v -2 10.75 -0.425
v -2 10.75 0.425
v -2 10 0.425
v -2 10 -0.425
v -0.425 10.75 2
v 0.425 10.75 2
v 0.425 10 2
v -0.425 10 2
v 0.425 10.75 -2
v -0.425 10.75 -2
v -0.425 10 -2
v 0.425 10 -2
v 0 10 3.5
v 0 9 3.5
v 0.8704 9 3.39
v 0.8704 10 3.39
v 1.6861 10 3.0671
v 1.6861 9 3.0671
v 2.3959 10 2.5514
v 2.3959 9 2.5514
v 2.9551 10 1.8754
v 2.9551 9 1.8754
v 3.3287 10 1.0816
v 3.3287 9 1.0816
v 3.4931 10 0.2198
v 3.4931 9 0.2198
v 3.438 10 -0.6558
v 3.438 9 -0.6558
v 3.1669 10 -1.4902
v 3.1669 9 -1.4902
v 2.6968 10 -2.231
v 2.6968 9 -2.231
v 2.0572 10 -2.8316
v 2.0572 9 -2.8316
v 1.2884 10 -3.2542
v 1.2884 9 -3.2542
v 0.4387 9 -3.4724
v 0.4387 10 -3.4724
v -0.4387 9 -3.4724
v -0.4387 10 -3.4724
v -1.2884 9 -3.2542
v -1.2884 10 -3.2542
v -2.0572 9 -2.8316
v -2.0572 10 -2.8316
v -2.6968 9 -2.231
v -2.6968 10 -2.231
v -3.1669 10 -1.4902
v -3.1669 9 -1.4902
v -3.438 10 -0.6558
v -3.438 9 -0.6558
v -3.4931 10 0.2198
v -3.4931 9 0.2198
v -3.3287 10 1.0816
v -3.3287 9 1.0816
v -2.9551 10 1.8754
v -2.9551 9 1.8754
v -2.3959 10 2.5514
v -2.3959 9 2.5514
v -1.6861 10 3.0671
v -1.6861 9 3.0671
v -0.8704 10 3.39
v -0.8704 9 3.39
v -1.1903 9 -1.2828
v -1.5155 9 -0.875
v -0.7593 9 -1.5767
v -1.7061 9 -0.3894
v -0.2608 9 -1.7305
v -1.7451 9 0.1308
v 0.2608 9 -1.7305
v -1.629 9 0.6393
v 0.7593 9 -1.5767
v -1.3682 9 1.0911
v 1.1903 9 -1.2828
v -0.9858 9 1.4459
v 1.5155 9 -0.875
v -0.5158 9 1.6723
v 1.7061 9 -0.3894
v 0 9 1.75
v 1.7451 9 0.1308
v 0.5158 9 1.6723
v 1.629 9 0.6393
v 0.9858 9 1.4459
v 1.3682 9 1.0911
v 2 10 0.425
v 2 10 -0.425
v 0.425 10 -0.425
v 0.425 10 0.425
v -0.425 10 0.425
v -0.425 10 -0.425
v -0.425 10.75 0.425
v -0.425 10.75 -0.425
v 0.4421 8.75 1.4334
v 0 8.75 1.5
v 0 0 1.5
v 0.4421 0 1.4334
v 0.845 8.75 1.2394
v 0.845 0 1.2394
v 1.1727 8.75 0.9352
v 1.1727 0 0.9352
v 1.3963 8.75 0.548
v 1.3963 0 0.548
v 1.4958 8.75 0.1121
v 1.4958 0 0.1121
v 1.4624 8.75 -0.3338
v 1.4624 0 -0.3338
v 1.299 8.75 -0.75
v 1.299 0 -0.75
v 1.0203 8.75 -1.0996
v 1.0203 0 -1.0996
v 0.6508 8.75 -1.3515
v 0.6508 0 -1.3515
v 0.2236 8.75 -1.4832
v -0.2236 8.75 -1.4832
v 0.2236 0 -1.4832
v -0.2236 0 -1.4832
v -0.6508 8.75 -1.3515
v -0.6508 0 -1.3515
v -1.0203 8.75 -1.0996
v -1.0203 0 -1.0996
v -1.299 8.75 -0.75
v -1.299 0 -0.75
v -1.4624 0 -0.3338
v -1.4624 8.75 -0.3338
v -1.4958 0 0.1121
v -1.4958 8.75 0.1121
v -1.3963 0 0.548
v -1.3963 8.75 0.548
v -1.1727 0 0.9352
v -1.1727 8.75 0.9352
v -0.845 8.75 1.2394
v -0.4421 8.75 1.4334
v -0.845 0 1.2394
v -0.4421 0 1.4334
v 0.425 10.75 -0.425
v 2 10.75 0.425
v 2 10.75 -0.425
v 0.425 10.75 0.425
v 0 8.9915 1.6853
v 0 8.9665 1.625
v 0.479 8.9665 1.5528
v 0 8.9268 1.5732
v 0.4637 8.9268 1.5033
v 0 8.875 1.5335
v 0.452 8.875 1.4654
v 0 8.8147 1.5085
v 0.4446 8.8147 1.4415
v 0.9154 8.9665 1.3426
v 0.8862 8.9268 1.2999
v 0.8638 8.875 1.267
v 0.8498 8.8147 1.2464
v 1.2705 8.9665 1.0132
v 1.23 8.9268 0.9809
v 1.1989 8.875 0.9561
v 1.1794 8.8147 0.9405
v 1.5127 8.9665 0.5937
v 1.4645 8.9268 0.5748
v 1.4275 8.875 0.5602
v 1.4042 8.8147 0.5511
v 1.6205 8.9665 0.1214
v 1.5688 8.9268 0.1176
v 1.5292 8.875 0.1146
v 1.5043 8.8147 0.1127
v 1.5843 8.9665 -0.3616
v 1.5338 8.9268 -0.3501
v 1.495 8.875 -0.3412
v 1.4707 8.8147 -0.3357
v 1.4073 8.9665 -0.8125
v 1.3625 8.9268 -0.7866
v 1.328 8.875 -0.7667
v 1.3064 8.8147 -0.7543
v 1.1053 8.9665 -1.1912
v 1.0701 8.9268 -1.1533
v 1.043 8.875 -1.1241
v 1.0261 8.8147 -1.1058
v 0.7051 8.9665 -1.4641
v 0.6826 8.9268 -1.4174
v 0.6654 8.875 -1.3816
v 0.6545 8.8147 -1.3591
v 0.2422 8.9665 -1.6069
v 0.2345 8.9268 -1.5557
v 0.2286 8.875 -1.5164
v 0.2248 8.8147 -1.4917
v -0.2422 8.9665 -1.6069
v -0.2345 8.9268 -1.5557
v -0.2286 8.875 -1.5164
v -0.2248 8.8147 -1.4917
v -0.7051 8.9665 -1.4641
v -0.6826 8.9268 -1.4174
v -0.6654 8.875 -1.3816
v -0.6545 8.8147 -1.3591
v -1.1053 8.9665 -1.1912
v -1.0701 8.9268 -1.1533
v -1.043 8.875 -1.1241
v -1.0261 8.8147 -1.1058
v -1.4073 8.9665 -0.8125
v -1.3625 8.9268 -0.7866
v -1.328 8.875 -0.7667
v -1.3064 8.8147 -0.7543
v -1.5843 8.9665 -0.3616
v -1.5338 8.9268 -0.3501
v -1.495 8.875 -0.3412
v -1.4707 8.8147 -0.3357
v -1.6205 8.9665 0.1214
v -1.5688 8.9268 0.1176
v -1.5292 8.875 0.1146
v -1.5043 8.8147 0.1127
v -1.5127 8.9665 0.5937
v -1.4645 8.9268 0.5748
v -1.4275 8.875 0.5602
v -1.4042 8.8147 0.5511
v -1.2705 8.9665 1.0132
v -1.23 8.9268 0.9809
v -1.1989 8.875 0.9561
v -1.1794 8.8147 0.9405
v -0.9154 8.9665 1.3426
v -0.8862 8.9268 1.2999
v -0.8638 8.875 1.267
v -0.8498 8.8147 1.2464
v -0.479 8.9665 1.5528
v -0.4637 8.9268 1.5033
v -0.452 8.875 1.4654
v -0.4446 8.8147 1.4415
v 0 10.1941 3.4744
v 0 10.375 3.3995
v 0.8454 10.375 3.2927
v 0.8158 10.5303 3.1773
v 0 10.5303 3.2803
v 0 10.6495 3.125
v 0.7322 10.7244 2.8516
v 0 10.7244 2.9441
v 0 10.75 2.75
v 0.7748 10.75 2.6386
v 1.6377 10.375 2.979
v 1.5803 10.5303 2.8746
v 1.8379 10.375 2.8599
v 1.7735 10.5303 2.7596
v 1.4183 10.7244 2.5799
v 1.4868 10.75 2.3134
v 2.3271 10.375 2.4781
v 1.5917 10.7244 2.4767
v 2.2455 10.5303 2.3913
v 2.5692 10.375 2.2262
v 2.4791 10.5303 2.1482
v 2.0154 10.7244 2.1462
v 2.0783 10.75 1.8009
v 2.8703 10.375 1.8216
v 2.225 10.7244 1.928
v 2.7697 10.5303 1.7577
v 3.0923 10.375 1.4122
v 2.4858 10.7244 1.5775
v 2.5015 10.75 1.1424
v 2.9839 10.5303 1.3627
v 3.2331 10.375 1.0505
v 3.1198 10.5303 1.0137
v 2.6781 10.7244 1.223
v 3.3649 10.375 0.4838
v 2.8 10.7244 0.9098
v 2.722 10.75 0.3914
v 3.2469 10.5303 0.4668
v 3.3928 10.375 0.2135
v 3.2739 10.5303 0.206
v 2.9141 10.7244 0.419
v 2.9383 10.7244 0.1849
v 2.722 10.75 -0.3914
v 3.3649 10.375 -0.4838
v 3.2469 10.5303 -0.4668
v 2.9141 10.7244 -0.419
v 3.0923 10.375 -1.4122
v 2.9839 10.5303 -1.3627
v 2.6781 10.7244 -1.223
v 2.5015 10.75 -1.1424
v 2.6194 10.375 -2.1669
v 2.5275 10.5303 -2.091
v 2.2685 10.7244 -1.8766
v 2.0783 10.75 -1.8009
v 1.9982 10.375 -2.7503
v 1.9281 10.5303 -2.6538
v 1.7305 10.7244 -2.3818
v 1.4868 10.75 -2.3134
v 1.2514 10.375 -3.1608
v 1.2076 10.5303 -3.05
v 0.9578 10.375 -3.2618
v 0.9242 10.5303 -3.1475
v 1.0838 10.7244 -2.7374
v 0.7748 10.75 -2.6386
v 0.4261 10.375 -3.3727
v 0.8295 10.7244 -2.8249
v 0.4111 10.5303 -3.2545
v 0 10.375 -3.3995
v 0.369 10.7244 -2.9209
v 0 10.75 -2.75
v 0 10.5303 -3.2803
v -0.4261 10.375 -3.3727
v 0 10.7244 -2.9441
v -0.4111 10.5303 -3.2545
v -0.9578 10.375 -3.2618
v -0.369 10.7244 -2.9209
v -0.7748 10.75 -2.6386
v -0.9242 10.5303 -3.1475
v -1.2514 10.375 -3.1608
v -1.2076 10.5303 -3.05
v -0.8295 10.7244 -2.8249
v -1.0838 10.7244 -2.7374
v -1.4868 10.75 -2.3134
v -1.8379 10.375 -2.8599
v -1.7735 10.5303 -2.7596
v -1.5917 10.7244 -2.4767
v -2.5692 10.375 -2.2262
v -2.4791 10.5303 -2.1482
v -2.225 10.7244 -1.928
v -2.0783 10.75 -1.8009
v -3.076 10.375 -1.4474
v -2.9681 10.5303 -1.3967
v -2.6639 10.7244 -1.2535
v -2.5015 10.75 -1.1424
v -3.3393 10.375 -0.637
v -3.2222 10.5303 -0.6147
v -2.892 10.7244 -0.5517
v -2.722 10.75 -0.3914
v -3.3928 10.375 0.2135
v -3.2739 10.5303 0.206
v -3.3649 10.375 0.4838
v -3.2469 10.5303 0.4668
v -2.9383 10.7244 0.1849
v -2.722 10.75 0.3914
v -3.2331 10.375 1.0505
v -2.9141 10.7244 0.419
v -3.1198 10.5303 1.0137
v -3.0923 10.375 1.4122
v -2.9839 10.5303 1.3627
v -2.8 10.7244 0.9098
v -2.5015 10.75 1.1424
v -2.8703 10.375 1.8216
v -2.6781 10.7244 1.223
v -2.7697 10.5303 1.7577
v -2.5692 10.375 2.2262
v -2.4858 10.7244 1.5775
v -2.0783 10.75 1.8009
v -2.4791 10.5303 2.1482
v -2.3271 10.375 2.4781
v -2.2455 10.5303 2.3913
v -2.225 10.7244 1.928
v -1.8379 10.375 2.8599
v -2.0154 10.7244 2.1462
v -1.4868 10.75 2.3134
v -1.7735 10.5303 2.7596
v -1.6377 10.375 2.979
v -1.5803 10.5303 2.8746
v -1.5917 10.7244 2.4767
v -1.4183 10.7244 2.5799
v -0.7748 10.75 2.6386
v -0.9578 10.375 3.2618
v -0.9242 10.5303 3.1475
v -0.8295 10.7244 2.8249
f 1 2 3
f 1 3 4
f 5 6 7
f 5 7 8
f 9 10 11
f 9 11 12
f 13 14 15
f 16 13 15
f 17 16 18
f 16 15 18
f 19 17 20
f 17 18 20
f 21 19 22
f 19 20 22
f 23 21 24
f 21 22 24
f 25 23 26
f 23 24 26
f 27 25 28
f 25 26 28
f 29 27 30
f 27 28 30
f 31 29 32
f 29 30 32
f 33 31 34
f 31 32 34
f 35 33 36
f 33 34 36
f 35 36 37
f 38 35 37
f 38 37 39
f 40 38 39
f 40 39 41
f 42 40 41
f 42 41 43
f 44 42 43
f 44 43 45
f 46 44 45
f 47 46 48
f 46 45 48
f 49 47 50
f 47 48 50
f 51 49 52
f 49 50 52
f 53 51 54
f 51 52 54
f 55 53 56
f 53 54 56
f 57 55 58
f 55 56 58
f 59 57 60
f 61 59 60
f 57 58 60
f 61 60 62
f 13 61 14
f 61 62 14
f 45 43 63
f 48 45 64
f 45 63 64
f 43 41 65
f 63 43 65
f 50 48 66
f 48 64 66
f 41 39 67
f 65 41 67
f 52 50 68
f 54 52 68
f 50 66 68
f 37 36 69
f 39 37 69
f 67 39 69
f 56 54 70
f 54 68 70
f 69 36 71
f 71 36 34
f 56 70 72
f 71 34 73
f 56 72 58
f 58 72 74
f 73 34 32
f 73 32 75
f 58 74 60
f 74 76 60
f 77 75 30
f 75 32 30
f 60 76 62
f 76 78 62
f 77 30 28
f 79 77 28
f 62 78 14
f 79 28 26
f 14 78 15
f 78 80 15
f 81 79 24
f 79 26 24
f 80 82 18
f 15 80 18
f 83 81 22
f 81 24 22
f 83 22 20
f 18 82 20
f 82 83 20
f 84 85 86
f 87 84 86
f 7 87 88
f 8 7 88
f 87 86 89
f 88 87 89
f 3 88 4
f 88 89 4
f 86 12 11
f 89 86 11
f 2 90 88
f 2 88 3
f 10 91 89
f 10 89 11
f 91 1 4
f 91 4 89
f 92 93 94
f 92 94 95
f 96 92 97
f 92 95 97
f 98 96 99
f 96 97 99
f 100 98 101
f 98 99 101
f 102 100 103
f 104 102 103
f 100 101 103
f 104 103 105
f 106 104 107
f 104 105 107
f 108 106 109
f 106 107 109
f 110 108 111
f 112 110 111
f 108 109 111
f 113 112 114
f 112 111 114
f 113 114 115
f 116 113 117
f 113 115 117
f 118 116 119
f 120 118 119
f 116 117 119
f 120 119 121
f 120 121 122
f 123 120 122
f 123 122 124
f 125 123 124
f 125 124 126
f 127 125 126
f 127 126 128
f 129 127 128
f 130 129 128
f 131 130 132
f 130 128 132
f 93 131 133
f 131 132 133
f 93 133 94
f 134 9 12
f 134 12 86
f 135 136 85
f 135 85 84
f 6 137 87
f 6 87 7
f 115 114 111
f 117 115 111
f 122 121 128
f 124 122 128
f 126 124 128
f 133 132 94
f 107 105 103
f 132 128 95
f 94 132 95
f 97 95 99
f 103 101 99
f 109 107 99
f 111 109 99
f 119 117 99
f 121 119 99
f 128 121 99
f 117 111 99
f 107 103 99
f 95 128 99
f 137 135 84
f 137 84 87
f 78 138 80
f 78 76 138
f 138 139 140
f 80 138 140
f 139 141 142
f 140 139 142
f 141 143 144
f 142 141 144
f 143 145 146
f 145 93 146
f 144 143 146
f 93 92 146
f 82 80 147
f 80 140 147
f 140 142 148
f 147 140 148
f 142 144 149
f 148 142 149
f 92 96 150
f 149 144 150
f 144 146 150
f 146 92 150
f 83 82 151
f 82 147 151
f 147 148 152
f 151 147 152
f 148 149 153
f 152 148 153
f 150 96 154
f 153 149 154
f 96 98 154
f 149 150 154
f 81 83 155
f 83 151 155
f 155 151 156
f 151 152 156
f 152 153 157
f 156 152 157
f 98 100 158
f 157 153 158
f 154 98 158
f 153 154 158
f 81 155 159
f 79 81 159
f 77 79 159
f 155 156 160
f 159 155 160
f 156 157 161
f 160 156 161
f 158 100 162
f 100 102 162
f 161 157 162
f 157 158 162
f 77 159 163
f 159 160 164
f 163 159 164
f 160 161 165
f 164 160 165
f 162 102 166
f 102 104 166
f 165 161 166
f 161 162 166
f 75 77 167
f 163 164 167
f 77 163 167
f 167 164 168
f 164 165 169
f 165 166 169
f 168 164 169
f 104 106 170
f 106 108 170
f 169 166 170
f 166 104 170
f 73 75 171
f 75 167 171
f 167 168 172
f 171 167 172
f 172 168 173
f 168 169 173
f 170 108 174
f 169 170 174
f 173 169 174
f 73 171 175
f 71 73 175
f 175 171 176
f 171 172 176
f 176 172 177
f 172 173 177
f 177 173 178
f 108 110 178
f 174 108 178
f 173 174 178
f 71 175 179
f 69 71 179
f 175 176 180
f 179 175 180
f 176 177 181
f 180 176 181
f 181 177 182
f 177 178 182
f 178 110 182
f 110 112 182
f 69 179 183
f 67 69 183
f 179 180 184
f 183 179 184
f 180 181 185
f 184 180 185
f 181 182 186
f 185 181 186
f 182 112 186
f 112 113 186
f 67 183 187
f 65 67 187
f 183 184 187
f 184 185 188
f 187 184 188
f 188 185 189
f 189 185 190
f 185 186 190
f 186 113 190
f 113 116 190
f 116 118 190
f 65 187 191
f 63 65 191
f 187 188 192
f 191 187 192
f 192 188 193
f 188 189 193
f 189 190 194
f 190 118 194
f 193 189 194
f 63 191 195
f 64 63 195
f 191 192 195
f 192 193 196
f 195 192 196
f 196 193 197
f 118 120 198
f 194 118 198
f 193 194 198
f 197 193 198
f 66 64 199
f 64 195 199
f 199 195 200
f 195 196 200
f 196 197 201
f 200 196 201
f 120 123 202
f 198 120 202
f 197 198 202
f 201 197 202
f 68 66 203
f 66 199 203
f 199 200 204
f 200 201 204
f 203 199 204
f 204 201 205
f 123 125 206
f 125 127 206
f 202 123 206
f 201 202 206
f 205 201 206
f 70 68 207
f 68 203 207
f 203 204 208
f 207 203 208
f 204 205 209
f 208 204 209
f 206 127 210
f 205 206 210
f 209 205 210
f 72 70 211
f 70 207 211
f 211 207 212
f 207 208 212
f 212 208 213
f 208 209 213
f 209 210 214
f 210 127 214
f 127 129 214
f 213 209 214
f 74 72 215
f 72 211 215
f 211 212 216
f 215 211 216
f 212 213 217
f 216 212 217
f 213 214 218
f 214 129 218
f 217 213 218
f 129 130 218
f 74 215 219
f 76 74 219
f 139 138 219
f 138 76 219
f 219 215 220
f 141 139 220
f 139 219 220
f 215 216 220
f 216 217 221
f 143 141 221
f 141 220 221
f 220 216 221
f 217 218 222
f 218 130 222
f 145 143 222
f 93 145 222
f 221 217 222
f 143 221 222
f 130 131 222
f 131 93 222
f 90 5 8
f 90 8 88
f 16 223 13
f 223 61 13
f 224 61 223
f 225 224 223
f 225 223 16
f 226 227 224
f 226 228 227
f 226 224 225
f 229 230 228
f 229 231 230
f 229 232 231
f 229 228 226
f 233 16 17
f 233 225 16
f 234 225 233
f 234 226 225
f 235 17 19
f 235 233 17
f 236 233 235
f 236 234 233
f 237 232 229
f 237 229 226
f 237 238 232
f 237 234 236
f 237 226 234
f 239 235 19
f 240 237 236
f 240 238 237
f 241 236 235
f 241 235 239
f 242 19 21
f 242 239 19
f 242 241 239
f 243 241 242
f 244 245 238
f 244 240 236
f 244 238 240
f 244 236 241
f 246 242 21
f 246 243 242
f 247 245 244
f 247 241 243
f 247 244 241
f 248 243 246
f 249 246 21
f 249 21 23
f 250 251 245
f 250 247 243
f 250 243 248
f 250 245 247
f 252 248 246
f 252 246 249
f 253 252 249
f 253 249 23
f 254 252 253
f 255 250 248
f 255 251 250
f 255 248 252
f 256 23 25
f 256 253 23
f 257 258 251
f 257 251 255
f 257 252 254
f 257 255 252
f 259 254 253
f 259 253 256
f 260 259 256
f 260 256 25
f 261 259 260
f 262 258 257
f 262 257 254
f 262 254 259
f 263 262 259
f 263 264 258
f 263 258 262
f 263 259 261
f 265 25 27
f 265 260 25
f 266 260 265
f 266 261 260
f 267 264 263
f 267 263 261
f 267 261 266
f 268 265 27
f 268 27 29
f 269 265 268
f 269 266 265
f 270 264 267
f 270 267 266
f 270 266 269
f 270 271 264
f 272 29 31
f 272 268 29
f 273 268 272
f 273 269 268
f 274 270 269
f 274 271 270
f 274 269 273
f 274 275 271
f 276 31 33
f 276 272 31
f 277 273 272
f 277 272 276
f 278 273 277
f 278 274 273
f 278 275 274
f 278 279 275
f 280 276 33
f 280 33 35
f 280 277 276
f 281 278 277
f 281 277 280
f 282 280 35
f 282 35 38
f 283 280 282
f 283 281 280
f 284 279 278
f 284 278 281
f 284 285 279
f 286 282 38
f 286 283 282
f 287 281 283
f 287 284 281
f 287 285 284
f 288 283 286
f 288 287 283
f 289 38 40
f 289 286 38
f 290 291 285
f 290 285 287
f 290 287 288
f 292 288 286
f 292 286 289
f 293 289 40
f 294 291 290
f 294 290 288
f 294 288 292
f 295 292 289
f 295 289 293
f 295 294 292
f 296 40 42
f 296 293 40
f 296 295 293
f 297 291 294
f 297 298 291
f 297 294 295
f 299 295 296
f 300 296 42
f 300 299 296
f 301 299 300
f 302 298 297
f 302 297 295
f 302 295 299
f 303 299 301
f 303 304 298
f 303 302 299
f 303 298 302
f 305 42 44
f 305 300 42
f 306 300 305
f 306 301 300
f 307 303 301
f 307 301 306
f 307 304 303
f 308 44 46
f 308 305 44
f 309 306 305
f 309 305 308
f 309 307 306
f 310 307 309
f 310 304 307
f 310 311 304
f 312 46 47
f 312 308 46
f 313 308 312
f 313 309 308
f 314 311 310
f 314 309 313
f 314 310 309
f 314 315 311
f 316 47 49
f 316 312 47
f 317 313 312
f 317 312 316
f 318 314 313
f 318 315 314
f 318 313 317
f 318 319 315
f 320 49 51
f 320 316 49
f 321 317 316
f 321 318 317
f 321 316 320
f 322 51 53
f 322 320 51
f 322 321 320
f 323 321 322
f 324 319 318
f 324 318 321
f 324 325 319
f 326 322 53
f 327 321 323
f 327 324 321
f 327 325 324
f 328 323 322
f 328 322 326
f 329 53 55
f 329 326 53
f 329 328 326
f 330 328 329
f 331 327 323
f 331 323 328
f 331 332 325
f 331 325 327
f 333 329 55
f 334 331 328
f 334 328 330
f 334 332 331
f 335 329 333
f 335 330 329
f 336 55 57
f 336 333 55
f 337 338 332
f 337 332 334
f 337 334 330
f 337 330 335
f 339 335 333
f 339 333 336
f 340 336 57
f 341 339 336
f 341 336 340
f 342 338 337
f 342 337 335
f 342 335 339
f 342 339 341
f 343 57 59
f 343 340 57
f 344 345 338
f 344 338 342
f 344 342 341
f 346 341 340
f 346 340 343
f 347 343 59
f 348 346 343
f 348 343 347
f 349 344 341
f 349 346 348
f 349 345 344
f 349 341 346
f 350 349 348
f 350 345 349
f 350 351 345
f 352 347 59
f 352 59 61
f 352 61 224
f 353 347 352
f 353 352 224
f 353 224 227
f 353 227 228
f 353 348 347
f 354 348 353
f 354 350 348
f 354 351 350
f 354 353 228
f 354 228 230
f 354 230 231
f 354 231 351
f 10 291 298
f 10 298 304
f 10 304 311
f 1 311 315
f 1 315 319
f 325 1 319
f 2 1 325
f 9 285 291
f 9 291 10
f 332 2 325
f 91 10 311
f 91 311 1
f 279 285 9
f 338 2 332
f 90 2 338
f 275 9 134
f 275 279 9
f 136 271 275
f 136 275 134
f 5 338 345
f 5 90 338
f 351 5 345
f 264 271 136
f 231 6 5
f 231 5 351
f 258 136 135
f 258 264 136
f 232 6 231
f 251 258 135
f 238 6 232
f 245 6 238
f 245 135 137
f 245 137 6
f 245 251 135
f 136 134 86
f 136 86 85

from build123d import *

# Parameters (mm, degrees)
SKETCH3_R           = 1.5
BOSS_EXTRUDE1_DEPTH = 9
SKETCH4_R           = 3.5
BOSS_EXTRUDE2_DEPTH = 1.75
FILLET3_R           = 0.75
CUT_EXTRUDE4_DEPTH  = 0.75
FILLET4_R           = 0.25


with BuildPart() as part:
    # Sketch3 → Boss-Extrude1 (new body)
    with BuildSketch(Plane(origin=(0, 0, 0), x_dir=(1, 0, 0), z_dir=(0, 1, 0))):
        with Locations(Location((0, 0, 0), (0, 0, 270))):
            Circle(SKETCH3_R)
    extrude(amount=BOSS_EXTRUDE1_DEPTH)

    # Sketch4 → Boss-Extrude2 (add)
    with BuildSketch(Plane(origin=(0, 9, 0), x_dir=(1, 0, 0), z_dir=(0, 1, 0))):
        with Locations(Location((0, 0, 0), (0, 0, 270))):
            Circle(SKETCH4_R)
    extrude(amount=BOSS_EXTRUDE2_DEPTH)

    # Fillet3
    fillet3_edges = [part.edges().sort_by_distance(p)[0] for p in [
        (0, 10.75, -3.5),
    ]]
    fillet(fillet3_edges, radius=FILLET3_R)

    # Sketch6 → Cut-Extrude4 (cut)
    with BuildSketch(Plane(origin=(0, 10.75, 0), x_dir=(1, 0, 0), z_dir=(0, 1, 0))):
        Polygon((0.425, 0.425), (2, 0.425), (2, -0.425), (0.425, -0.425), (0.425, -2), (-0.425, -2), (-0.425, -0.425), (-2, -0.425), (-2, 0.425), (-0.425, 0.425), (-0.425, 2), (0.425, 2), align=None)
    extrude(amount=-CUT_EXTRUDE4_DEPTH, mode=Mode.SUBTRACT)

    # Fillet4
    fillet4_edges = [part.edges().sort_by_distance(p)[0] for p in [
        (0, 9, -1.5),
    ]]
    fillet(fillet4_edges, radius=FILLET4_R)


solid = part.part
